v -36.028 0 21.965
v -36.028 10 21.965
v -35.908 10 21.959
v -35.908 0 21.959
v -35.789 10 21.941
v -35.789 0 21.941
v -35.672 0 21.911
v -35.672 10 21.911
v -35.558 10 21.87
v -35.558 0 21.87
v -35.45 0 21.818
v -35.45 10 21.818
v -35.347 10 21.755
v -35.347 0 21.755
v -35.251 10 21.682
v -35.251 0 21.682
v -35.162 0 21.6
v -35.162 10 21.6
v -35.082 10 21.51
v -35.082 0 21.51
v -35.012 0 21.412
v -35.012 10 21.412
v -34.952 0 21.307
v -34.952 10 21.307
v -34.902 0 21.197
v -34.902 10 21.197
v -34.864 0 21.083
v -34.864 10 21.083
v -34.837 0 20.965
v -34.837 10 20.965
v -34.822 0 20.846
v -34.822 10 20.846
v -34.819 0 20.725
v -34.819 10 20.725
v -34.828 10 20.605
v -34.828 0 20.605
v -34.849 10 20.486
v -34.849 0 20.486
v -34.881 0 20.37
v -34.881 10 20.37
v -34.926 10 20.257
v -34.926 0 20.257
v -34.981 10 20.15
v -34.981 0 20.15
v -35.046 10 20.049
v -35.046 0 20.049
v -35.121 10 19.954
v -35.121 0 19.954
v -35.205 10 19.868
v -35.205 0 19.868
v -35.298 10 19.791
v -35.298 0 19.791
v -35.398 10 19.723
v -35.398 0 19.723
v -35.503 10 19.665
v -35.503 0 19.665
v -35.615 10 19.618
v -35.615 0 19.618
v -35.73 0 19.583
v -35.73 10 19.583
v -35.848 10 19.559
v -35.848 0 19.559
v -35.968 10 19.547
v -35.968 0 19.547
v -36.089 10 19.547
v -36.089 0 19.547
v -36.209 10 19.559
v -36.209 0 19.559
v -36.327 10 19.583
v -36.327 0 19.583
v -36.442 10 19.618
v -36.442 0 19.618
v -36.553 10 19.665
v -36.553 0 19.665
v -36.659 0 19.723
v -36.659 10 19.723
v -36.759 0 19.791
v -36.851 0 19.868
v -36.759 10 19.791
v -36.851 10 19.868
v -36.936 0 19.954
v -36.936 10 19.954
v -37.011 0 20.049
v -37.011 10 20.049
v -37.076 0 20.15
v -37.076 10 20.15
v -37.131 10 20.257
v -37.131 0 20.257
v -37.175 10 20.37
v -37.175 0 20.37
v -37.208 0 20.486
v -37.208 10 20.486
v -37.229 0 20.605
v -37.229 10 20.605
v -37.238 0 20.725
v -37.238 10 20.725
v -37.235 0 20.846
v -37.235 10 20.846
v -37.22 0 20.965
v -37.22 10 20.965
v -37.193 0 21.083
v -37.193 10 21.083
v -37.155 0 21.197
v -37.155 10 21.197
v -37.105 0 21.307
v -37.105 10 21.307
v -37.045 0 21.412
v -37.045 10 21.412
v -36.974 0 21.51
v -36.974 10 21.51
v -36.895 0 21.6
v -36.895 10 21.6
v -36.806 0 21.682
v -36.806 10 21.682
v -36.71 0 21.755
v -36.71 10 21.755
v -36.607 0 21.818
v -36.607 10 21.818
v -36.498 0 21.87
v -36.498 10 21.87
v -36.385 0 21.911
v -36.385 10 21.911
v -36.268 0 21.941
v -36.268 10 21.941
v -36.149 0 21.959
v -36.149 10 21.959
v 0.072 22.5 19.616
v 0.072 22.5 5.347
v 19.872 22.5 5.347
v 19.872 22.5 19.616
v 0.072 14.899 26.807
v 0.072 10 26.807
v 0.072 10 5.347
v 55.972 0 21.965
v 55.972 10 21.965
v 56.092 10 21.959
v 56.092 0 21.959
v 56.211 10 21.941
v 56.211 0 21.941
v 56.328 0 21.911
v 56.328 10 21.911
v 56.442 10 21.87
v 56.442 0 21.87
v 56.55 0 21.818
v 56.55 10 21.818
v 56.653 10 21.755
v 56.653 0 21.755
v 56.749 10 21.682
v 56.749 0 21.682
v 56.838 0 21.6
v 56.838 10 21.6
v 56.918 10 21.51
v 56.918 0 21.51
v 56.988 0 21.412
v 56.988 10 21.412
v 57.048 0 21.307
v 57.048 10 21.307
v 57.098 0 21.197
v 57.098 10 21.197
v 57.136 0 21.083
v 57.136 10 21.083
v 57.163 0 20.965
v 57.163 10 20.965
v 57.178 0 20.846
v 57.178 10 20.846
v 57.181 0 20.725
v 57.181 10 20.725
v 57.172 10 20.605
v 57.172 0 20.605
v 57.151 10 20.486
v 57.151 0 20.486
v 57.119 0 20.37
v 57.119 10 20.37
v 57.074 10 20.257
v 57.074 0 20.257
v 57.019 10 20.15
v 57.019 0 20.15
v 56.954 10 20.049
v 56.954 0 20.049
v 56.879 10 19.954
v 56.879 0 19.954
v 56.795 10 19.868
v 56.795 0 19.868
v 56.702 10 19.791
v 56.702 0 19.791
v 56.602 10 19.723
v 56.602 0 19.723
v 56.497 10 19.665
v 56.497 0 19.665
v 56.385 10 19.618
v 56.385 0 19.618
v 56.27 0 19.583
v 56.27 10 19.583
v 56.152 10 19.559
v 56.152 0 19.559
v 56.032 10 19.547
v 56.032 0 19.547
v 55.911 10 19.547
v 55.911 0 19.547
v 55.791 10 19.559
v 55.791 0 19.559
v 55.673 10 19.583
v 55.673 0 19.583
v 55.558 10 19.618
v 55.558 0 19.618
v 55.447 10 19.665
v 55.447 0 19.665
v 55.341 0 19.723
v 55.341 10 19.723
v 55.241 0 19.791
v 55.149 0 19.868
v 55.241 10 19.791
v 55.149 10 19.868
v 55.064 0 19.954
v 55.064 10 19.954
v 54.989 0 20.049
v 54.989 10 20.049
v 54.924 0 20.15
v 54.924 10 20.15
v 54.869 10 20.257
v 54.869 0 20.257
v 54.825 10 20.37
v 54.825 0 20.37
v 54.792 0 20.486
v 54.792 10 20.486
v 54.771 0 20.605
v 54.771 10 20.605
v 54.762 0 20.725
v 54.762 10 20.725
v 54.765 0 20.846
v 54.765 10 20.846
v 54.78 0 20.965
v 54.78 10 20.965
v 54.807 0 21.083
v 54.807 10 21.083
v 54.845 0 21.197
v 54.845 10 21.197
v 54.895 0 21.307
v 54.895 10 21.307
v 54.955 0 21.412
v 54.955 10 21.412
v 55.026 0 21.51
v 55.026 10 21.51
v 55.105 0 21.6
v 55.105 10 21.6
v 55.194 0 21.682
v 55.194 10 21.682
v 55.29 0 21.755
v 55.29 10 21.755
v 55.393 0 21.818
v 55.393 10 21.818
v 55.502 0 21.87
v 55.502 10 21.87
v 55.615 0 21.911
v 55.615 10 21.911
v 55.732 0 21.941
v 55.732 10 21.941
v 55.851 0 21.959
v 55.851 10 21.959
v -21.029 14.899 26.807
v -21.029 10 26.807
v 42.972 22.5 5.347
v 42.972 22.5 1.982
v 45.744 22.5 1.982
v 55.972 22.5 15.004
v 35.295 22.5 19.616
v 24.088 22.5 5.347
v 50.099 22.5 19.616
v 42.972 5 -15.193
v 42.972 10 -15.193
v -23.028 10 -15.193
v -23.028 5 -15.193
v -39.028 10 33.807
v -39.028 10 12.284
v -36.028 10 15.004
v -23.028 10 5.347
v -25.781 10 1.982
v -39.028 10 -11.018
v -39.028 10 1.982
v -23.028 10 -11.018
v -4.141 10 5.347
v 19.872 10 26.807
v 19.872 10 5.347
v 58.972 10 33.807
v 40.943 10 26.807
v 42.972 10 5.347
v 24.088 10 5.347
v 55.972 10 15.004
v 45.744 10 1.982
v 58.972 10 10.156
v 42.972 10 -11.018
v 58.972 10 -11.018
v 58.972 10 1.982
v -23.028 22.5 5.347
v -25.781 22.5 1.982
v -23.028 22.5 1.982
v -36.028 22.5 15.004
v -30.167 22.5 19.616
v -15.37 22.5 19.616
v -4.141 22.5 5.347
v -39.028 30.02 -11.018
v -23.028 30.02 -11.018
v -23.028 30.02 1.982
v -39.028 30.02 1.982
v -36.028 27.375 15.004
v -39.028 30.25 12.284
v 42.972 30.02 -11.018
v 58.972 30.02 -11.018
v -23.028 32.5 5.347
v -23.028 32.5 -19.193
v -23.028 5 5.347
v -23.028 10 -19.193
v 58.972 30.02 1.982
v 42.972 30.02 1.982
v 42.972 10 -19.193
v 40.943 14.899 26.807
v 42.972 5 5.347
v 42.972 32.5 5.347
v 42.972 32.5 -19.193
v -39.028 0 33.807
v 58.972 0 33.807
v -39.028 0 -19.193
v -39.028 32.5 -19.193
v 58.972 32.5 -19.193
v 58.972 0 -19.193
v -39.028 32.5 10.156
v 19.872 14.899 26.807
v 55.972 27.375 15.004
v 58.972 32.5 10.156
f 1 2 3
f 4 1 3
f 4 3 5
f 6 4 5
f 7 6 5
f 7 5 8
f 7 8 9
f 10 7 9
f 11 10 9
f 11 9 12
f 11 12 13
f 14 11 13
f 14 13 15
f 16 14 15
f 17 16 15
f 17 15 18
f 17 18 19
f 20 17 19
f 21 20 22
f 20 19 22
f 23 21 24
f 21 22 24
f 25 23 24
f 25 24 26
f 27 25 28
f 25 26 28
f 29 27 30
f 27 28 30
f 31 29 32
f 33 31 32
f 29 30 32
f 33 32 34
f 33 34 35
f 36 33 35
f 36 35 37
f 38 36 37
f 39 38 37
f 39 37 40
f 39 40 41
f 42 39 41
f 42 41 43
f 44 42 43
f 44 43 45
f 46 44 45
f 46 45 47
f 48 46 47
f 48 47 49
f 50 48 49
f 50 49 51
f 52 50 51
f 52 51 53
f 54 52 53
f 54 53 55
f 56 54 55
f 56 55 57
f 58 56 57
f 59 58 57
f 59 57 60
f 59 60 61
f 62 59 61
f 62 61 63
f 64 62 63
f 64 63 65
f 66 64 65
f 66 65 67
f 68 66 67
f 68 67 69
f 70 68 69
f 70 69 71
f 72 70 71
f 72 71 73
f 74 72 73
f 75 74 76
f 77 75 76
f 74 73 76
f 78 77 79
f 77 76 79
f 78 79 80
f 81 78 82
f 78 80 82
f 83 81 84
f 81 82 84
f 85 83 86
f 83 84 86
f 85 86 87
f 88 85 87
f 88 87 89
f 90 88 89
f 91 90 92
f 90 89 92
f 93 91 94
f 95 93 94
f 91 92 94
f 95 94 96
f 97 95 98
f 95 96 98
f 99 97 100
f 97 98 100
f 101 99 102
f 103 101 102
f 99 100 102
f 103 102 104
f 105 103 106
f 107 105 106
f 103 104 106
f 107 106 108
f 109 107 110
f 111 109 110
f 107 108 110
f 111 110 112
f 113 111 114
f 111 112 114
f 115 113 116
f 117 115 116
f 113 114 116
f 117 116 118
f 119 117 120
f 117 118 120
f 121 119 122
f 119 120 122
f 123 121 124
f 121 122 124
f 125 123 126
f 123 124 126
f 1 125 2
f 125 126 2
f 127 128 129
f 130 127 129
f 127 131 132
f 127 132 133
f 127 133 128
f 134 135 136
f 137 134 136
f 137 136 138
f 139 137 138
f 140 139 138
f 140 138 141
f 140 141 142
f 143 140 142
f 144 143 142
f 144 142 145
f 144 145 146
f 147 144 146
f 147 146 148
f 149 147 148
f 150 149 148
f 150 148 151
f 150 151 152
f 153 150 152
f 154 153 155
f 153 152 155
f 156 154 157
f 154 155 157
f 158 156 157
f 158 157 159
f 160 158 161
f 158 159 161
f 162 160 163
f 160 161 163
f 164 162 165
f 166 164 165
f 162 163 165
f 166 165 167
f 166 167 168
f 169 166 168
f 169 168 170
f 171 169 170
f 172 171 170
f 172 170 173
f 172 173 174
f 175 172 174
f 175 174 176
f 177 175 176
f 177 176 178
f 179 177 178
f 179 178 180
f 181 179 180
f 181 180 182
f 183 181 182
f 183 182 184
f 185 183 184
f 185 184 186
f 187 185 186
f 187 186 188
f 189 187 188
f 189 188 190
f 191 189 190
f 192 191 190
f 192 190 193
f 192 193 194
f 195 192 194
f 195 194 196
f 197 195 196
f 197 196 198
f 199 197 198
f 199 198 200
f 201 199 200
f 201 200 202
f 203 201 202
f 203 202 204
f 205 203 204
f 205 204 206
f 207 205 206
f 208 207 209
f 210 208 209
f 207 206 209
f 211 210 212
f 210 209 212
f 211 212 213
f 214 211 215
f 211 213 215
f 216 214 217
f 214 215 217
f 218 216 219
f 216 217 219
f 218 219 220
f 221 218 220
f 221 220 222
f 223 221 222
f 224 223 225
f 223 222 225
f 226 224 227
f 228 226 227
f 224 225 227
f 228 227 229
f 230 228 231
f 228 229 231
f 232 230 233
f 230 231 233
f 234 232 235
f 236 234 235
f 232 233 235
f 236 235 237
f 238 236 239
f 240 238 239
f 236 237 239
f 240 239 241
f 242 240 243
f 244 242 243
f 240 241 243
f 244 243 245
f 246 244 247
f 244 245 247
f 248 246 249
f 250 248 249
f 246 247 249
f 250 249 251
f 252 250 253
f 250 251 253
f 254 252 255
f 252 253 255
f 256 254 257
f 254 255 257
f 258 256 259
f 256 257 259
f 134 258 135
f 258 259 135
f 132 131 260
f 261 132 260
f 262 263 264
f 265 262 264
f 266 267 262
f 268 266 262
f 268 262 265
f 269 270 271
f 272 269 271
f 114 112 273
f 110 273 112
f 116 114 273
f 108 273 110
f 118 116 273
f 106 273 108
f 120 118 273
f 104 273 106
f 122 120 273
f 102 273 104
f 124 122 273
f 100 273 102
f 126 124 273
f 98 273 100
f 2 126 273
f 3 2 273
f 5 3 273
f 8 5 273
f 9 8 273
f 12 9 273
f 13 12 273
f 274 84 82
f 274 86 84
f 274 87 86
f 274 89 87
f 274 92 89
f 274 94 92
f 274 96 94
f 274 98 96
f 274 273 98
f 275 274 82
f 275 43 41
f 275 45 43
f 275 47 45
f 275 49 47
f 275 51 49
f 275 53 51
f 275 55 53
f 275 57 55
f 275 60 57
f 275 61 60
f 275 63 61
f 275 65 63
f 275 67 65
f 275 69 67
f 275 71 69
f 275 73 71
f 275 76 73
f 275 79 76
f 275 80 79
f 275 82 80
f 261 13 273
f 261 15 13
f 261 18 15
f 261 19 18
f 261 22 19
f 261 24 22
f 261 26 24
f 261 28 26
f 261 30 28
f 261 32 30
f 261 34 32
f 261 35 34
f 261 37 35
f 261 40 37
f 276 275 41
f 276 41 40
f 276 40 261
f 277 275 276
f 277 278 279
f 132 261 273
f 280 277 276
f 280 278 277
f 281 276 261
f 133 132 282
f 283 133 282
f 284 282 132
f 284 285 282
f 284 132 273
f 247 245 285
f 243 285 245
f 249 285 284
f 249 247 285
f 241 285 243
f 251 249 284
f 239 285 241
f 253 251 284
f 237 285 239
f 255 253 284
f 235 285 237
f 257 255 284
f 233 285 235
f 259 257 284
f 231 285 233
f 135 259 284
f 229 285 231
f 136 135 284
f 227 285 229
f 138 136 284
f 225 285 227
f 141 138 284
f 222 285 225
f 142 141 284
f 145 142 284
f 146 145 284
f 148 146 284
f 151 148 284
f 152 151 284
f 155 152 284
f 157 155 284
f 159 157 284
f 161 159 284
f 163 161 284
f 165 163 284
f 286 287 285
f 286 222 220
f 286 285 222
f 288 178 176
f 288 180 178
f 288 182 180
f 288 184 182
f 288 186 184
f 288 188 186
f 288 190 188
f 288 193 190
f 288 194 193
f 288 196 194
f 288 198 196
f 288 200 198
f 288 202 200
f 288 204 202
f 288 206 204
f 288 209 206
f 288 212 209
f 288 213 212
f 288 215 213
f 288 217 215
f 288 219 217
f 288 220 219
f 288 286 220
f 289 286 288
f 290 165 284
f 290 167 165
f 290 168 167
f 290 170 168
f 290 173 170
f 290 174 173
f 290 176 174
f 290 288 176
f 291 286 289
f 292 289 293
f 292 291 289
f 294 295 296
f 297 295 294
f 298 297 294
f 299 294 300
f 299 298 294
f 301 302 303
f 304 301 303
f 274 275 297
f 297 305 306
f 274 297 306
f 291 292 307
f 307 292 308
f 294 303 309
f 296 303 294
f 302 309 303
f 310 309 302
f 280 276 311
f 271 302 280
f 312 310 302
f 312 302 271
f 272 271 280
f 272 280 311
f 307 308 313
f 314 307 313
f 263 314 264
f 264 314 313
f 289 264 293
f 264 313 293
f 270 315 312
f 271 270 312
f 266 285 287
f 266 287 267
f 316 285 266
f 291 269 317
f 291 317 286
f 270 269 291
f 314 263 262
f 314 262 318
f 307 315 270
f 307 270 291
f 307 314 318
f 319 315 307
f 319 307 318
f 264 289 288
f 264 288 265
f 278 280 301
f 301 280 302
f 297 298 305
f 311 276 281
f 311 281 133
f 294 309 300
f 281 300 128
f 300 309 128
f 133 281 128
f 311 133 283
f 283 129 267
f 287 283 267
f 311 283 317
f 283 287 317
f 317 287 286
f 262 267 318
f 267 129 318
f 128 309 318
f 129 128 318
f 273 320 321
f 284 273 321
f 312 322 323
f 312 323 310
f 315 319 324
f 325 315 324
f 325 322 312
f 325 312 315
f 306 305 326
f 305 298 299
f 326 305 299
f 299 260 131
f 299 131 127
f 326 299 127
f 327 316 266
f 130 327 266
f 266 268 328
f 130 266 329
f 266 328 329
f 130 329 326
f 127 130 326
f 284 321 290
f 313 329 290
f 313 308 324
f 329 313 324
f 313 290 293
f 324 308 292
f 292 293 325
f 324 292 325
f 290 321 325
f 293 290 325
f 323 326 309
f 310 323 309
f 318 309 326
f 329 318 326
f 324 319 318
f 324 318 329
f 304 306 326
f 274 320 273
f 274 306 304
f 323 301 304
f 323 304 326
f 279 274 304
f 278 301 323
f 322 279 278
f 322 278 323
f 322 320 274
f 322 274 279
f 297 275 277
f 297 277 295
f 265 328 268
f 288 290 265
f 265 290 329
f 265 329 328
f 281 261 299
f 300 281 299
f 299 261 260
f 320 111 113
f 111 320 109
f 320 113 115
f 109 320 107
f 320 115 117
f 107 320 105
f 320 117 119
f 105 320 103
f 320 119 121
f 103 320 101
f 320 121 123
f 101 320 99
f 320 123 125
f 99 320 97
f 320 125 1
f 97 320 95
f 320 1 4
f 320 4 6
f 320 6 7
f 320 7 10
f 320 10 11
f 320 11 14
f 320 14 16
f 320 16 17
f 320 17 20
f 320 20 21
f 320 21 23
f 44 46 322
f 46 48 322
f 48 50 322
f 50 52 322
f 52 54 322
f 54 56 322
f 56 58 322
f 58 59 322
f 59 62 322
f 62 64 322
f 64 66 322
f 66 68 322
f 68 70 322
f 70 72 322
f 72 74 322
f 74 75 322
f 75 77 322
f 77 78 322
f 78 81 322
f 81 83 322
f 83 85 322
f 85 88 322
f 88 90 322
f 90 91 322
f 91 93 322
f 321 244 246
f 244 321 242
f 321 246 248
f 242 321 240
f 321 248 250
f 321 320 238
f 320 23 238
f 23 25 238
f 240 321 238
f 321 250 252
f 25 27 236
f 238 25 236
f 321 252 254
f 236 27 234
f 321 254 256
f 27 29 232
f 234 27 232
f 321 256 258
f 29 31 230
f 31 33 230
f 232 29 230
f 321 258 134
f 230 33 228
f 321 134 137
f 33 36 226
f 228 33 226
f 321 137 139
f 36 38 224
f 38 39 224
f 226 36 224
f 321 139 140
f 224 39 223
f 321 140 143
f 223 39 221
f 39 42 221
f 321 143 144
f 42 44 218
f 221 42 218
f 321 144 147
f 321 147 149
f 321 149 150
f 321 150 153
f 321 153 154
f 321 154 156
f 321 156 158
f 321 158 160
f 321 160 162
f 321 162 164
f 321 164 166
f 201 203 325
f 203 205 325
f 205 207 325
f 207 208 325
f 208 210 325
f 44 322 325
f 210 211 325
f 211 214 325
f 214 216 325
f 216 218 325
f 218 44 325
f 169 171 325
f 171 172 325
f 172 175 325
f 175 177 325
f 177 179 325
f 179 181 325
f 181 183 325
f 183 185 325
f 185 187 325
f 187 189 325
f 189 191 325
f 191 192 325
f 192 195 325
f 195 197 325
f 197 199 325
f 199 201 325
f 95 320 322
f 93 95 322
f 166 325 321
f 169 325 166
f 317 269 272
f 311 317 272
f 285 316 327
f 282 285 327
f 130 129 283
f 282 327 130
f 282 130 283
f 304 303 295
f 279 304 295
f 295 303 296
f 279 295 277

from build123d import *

# Parameters (mm, degrees)
CROQUIS1_W              = 98
CROQUIS1_H              = 53
SALIENTE_EXTRUIR1_DEPTH = 35
CROQUIS2_R              = 1.052356083
CORTAR_EXTRUIR1_DEPTH   = 25
CROQUIS4_R              = 1.21
CORTAR_EXTRUIR2_DEPTH   = 77.456439381
CROQUIS5_R              = 1.21
CORTAR_EXTRUIR3_DEPTH   = 77.456439381
CROQUIS6_W              = 19.087146806
CROQUIS6_H              = 12.5
CORTAR_EXTRUIR4_DEPTH   = 99.715019882
CROQUIS7_W              = 19.109936399
CROQUIS7_H              = 12.5
CORTAR_EXTRUIR5_DEPTH   = 95.352926478
CORTAR_EXTRUIR6_DEPTH   = 83.575081806
CORTAR_EXTRUIR7_DEPTH   = 30
CORTAR_EXTRUIR8_DEPTH   = 110.416374403
CORTAR_EXTRUIR9_DEPTH   = 24
CROQUIS12_W             = 107.668440241
CROQUIS12_H             = 57.968086936
CORTAR_EXTRUIR10_DEPTH  = 2.5
CORTAR_EXTRUIR11_DEPTH  = 109.642500834


with BuildPart() as part:
    # Croquis1 → Saliente-Extruir1 (new body)
    with BuildSketch(Plane(origin=(0, 0, 0), x_dir=(1, 0, 0), z_dir=(0, 1, 0))):
        with Locations((9.971553611, -7.307439825)):
            Rectangle(CROQUIS1_W, CROQUIS1_H)
    extrude(amount=SALIENTE_EXTRUIR1_DEPTH)

    # Croquis2 → Cortar-Extruir1 (cut)
    with BuildSketch(Plane(origin=(0, 35, 0), x_dir=(1, 0, 0), z_dir=(0, 1, 0))):
        Polygon((19.971553611, -26.807439825), (9.971553611, -26.807439825), (-0.028446389, -26.807439825), (-21.028702453, -26.807439825), (-36.028446389, -15.003760101), (-39.028446389, -12.284028263), (-39.028446389, -33.807439825), (58.971553611, -33.807439825), (58.971553611, -10.155599963), (55.971553611, -15.003760101), (40.942820659, -26.807439825), align=None)
        with Locations(Location((-36.028446389, -20.755083742, 0), (0, 0, 270))):
            Circle(CROQUIS2_R, mode=Mode.SUBTRACT)
        with Locations(Location((55.971553611, -20.755083742, 0), (0, 0, 270))):
            Circle(CROQUIS2_R, mode=Mode.SUBTRACT)
    extrude(amount=-CORTAR_EXTRUIR1_DEPTH, mode=Mode.SUBTRACT)

    # Croquis4 → Cortar-Extruir2 (cut, through all)
    with BuildSketch(Plane(origin=(0, 35, 0), x_dir=(1, 0, 0), z_dir=(0, 1, 0))):
        with Locations(Location((-36.028446389, -20.755083742, 0), (0, 0, 270))):
            Circle(CROQUIS4_R)
    extrude(amount=-CORTAR_EXTRUIR2_DEPTH, mode=Mode.SUBTRACT)

    # Croquis5 → Cortar-Extruir3 (cut, through all)
    with BuildSketch(Plane(origin=(0, 35, 0), x_dir=(1, 0, 0), z_dir=(0, 1, 0))):
        with Locations(Location((55.971553611, -20.755083742, 0), (0, 0, 270))):
            Circle(CROQUIS5_R)
    extrude(amount=-CORTAR_EXTRUIR3_DEPTH, mode=Mode.SUBTRACT)

    # Croquis6 → Cortar-Extruir4 (cut, through all)
    with BuildSketch(Plane(origin=(-21.069927214, 0, 26.774999013), x_dir=(0.7858557430790737, 0, 0.6184098568664935), z_dir=(-0.6184098568664935, 0, 0.7858557430790737))):
        with Locations((-9.49111497, 16.25)):
            Rectangle(CROQUIS6_W, CROQUIS6_H)
    extrude(amount=-CORTAR_EXTRUIR4_DEPTH, mode=Mode.SUBTRACT)

    # Croquis7 → Cortar-Extruir5 (cut, through all)
    with BuildSketch(Plane(origin=(28.642438973, 0, 36.468251975), x_dir=(0.7864355295732114, 0, -0.6176723709418307), z_dir=(0.6176723709418307, 0, 0.7864355295732114))):
        with Locations((25.195642131, 16.25)):
            Rectangle(CROQUIS7_W, CROQUIS7_H)
    extrude(amount=-CORTAR_EXTRUIR5_DEPTH, mode=Mode.SUBTRACT)

    # Croquis8 → Cortar-Extruir6 (cut, through all)
    with BuildSketch(Plane.XY.offset(26.807439825)):
        Polygon((9.971553611, 10), (0.071553611, 10), (0.071553611, 22.5), (9.971553611, 22.5), (19.871553611, 22.5), (19.871553611, 10), align=None)
    extrude(amount=-CORTAR_EXTRUIR6_DEPTH, mode=Mode.SUBTRACT)

    # Croquis9 → Cortar-Extruir7 (cut)
    with BuildSketch(Plane(origin=(0, 35, 0), x_dir=(1, 0, 0), z_dir=(0, 1, 0))):
        Polygon((9.971553611, 15.192560175), (42.971553611, 15.192560175), (42.971553611, -5.347439825), (9.971553611, -5.347439825), (-23.028446389, -5.347439825), (-23.028446389, 15.192560175), align=None)
    extrude(amount=-CORTAR_EXTRUIR7_DEPTH, mode=Mode.SUBTRACT)

    # Croquis10 → Cortar-Extruir8 (cut, through all)
    with BuildSketch(Plane(origin=(58.971553611, 0, 0), x_dir=(0, 0, -1), z_dir=(1, 0, 0))):
        Polygon((4.518480106, 10), (11.018480106, 10), (11.018480106, 30.02), (4.518480106, 30.02), (-1.981519894, 30.02), (-1.981519894, 10), align=None)
    extrude(amount=-CORTAR_EXTRUIR8_DEPTH, mode=Mode.SUBTRACT)

    # Croquis11 → Cortar-Extruir9 (cut)
    with BuildSketch(Plane(origin=(0, 0, -19.192560175), x_dir=(-1, 0, 0), z_dir=(0, 0, -1))):
        Polygon((-9.971553611, 35), (23.028446389, 35), (23.028446389, 10), (-9.971553611, 10), (-42.971553611, 10), (-42.971553611, 35), align=None)
    extrude(amount=-CORTAR_EXTRUIR9_DEPTH, mode=Mode.SUBTRACT)

    # Croquis12 → Cortar-Extruir10 (cut)
    with BuildSketch(Plane(origin=(0, 35, 0), x_dir=(1, 0, 0), z_dir=(0, 1, 0))):
        with Locations((11.756632462, -7.871148936)):
            Rectangle(CROQUIS12_W, CROQUIS12_H)
    extrude(amount=-CORTAR_EXTRUIR10_DEPTH, mode=Mode.SUBTRACT)

    # Croquis13 → Cortar-Extruir11 (cut, through all)
    with BuildSketch(Plane(origin=(58.971553611, 0, 0), x_dir=(0, 0, -1), z_dir=(1, 0, 0))):
        Polygon((-33.807439825, 32.5), (-33.807439825, 10), (-31.442255839, 10), (-10.155599963, 32.5), align=None)
    extrude(amount=-CORTAR_EXTRUIR11_DEPTH, mode=Mode.SUBTRACT)


solid = part.part
